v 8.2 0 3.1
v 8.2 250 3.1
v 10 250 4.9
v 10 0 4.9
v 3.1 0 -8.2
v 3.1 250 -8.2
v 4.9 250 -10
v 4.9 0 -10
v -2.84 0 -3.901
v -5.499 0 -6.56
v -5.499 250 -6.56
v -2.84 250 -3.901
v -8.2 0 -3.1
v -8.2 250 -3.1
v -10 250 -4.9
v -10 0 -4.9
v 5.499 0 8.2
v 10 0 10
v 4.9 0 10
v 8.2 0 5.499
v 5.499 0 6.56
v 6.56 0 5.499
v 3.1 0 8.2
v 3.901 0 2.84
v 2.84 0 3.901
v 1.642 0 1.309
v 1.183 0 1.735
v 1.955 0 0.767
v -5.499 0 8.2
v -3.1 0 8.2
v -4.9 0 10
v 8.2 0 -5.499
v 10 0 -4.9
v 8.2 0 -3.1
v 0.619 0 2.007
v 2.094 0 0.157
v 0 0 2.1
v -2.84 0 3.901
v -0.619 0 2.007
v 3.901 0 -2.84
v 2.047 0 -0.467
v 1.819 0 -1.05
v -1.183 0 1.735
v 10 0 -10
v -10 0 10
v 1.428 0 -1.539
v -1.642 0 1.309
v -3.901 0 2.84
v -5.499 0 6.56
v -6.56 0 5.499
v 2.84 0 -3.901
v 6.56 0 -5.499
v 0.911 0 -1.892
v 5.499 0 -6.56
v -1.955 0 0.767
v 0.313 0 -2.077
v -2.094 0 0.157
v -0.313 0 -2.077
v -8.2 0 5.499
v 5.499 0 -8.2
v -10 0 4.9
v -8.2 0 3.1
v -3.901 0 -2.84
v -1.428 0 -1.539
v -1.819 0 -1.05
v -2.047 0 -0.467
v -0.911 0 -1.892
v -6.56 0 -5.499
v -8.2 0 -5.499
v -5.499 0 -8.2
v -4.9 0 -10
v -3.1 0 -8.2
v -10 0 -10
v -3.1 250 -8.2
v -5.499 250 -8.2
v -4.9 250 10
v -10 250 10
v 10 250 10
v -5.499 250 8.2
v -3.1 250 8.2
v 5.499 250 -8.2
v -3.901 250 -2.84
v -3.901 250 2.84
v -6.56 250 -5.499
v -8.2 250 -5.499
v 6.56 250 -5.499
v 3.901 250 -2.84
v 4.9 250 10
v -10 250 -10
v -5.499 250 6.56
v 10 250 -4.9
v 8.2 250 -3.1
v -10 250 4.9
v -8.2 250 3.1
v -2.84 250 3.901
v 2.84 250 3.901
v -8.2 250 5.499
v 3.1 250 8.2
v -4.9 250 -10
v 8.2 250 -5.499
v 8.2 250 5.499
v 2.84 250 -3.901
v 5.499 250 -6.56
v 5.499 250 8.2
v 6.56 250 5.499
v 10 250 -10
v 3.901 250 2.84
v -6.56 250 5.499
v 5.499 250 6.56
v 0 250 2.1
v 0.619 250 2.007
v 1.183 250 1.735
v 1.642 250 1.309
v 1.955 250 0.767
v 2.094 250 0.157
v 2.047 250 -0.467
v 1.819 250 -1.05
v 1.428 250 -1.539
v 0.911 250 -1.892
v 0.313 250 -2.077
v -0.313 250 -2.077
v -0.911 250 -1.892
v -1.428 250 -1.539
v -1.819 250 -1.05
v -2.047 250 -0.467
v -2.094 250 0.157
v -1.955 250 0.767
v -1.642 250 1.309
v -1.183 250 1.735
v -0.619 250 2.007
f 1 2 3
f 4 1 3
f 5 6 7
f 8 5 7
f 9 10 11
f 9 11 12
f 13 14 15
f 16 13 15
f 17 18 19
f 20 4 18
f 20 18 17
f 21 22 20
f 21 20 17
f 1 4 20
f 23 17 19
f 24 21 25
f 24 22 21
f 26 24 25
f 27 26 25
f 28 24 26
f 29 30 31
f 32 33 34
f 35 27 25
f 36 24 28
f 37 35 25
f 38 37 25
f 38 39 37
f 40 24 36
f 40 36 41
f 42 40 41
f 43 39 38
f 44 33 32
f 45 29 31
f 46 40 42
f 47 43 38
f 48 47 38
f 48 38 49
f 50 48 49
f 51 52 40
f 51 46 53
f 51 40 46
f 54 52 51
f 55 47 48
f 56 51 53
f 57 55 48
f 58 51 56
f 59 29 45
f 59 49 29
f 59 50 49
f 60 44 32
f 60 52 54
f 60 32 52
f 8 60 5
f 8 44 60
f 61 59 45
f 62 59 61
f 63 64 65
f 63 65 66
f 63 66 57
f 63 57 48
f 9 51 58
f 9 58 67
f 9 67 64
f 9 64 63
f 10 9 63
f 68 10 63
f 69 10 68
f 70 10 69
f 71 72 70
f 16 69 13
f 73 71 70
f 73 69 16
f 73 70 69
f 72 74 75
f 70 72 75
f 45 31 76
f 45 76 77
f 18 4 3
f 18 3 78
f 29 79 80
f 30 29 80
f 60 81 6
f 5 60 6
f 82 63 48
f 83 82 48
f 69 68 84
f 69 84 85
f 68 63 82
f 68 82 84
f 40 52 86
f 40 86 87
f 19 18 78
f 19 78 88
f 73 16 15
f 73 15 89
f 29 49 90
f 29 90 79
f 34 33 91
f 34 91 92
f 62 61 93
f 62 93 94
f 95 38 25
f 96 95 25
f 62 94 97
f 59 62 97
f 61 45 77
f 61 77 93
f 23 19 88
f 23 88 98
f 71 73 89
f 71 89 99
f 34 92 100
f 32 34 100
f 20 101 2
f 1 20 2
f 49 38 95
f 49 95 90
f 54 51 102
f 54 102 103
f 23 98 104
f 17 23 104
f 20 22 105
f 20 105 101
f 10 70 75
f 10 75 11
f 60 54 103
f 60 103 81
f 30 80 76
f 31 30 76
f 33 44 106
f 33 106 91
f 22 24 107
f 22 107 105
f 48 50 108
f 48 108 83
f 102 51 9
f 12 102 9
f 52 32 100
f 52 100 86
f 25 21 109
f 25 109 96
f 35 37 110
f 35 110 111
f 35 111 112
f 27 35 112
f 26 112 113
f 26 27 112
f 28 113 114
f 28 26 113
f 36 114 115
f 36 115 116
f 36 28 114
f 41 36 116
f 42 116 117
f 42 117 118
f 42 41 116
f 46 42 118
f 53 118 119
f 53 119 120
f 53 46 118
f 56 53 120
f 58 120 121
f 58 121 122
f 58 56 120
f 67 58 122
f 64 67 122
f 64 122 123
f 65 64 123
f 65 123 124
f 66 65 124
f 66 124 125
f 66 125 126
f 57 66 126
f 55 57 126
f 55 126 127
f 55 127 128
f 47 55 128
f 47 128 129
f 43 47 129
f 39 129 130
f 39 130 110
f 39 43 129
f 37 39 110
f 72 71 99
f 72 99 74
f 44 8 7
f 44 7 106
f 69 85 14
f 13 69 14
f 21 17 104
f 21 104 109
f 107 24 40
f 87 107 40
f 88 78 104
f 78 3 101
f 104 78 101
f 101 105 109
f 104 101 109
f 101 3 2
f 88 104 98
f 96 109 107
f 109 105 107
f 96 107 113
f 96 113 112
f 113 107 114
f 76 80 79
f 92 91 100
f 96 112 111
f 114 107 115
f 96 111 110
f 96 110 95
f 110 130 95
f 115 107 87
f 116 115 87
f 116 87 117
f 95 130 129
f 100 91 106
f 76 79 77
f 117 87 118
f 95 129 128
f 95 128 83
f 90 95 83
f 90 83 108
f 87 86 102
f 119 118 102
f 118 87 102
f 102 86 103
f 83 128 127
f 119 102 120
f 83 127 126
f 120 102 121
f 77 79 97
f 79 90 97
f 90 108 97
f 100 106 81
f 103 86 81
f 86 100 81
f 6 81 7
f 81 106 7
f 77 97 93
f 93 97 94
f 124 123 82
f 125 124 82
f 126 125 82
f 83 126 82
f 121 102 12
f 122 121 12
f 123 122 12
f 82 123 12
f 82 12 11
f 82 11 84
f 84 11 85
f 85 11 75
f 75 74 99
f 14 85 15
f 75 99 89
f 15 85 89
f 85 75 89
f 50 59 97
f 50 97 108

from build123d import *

# Parameters (mm, degrees)
SKETCH1_R           = 2.1
BOSS_EXTRUDE1_DEPTH = 250


with BuildPart() as part:
    # Sketch1 → Boss-Extrude1 (new body)
    with BuildSketch(Plane(origin=(0, 0, 0), x_dir=(1, 0, 0), z_dir=(0, 1, 0))):
        Polygon((-3.900660172, -2.84), (-3.900660172, 0), (-3.900660172, 2.84), (-6.56, 5.499339828), (-8.2, 5.499339828), (-8.2, 3.1), (-10, 4.9), (-10, 10), (-4.9, 10), (-3.1, 8.2), (-5.499339828, 8.2), (-5.499339828, 6.56), (-2.84, 3.900660172), (0, 3.900660172), (2.84, 3.900660172), (5.499339828, 6.56), (5.499339828, 8.2), (3.1, 8.2), (4.9, 10), (10, 10), (10, 4.9), (8.2, 3.1), (8.2, 5.499339828), (6.56, 5.499339828), (3.900660172, 2.84), (3.900660172, 0), (3.900660172, -2.84), (6.56, -5.499339828), (8.2, -5.499339828), (8.2, -3.1), (10, -4.9), (10, -10), (4.9, -10), (3.1, -8.2), (5.499339828, -8.2), (5.499339828, -6.56), (2.84, -3.900660172), (0, -3.900660172), (-2.84, -3.900660172), (-5.499339828, -6.56), (-5.499339828, -8.2), (-3.1, -8.2), (-4.9, -10), (-10, -10), (-10, -4.9), (-8.2, -3.1), (-8.2, -5.499339828), (-6.56, -5.499339828), align=None)
        with Locations(Location((0, 0, 0), (0, 0, 270))):
            Circle(SKETCH1_R, mode=Mode.SUBTRACT)
    extrude(amount=BOSS_EXTRUDE1_DEPTH)


solid = part.part
